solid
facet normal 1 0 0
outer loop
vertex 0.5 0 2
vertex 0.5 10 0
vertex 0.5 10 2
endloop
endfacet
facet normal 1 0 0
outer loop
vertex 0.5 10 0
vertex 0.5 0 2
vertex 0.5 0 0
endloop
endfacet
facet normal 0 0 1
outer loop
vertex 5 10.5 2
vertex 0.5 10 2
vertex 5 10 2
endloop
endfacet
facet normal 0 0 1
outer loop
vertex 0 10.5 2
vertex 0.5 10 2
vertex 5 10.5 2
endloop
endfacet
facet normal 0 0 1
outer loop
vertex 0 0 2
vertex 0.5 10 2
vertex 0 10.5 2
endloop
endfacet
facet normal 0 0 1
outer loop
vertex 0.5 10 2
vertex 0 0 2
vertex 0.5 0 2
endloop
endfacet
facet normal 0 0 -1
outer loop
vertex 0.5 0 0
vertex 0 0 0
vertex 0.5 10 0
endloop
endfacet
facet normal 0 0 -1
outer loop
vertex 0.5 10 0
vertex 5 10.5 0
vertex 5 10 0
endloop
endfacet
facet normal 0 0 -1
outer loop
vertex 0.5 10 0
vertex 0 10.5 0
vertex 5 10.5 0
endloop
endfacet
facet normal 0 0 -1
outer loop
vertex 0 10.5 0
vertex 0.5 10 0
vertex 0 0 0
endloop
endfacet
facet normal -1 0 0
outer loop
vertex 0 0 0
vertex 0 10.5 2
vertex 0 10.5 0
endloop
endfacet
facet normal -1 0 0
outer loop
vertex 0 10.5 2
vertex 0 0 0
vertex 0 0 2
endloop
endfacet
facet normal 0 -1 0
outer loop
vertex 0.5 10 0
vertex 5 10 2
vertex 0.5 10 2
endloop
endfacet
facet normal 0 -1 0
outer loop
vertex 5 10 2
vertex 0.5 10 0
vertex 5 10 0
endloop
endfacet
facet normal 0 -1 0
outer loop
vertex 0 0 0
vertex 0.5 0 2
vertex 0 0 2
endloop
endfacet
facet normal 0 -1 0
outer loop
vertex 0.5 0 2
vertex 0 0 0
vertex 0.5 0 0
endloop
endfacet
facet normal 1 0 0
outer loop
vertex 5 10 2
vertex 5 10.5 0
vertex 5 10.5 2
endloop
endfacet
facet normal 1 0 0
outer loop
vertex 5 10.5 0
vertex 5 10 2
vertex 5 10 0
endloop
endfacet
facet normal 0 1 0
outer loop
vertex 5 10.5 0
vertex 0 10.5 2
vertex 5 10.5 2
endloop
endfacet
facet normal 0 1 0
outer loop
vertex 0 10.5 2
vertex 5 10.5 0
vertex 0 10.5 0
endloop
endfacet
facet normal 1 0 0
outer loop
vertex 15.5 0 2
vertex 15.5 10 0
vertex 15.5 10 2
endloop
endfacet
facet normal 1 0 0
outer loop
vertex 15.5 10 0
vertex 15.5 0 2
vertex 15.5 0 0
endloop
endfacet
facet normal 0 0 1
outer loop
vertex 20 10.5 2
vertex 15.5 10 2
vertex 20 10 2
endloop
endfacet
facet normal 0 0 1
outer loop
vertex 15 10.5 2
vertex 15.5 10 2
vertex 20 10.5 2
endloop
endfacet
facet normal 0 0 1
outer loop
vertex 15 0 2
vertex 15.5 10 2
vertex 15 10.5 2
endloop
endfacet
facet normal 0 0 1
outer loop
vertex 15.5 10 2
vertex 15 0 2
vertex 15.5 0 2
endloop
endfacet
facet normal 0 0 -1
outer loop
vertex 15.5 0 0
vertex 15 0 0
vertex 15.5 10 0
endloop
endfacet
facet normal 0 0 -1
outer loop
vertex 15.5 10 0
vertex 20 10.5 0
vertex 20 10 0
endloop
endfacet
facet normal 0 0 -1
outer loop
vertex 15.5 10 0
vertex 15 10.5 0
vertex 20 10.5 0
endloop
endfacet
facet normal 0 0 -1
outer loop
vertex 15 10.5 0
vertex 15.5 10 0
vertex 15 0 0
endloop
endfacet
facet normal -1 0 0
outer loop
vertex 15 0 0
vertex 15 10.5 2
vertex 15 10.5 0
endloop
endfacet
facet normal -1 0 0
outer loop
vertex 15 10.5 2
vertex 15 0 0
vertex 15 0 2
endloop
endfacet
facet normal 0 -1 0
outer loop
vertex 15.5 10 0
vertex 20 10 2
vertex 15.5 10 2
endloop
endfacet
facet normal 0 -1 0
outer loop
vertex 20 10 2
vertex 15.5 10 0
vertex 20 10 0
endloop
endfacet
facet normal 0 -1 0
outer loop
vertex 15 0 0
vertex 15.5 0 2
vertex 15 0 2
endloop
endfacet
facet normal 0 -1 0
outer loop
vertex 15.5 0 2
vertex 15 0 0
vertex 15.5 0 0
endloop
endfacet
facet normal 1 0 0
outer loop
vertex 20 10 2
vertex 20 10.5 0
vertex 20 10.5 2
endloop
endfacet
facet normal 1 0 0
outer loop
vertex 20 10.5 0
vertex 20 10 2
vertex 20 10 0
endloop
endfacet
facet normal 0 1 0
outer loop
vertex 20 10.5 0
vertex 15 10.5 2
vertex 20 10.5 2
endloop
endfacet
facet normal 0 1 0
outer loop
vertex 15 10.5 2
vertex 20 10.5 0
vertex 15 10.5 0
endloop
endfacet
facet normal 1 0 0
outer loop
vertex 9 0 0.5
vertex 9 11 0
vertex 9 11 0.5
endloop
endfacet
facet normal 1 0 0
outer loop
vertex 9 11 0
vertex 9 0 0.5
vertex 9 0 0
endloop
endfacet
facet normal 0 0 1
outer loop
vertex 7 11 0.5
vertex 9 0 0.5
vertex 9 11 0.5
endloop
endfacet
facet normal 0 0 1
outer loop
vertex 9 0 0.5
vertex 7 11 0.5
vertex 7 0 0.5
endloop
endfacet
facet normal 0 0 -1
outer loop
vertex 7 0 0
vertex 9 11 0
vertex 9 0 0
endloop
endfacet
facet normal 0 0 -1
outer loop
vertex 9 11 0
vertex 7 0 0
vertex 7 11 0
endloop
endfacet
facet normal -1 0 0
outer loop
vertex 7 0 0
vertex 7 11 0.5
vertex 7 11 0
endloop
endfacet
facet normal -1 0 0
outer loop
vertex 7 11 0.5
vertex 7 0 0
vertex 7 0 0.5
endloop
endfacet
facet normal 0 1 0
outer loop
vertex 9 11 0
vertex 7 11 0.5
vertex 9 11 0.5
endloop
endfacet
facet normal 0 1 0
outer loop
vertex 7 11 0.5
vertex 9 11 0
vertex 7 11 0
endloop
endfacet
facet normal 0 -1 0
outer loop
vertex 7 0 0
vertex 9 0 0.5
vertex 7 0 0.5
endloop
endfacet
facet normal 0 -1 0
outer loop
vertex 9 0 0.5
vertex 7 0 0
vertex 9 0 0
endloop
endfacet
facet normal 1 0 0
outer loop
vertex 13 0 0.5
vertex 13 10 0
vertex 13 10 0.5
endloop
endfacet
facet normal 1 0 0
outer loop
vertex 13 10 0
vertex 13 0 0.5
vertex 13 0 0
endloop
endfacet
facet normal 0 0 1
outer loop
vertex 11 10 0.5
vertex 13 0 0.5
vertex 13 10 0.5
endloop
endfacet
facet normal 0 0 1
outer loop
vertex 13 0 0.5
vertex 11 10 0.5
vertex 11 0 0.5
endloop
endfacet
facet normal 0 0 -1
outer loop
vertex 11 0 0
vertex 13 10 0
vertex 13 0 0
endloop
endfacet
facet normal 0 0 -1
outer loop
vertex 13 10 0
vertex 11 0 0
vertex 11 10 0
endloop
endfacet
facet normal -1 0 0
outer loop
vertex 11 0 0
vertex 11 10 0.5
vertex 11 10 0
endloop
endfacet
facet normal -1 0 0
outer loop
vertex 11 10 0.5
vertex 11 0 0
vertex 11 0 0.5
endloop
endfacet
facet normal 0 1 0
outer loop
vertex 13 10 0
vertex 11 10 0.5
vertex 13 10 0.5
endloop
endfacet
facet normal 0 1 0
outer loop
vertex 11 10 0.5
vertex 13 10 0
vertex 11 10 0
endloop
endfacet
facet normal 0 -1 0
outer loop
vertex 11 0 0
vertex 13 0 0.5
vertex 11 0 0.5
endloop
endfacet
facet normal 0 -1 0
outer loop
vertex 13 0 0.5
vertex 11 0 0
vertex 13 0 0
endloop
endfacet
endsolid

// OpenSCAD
module base (off, length, baseLen, tick, width) {
    translate([off,0,0]){
        cube([tick, length, width]);
    }
    translate([0,length,0]){
        cube([baseLen,tick,width]);
    }
}

module humerus (off, length, tick, width) {
    translate([off,0,0]){
        cube([width,length,tick]);
    }
}

module ulna (off, length, tick, width) {
    translate([off,0,0]){
        cube([width,length,tick]);
    }
}

module wrist (off, length, baseLen, tick, width) {
    translate([off,0,0]){
        cube([tick, length, width]);
    }
    translate([off,length,0]){
        cube([baseLen,tick,width]);
    }
}



base(0, 10, 5, 0.5, 2);
humerus(5+2, 11, 0.5, 2);
ulna(5+2+2+2, 10, 0.5, 2);
wrist(15, 10, 5, 0.5, 2);
